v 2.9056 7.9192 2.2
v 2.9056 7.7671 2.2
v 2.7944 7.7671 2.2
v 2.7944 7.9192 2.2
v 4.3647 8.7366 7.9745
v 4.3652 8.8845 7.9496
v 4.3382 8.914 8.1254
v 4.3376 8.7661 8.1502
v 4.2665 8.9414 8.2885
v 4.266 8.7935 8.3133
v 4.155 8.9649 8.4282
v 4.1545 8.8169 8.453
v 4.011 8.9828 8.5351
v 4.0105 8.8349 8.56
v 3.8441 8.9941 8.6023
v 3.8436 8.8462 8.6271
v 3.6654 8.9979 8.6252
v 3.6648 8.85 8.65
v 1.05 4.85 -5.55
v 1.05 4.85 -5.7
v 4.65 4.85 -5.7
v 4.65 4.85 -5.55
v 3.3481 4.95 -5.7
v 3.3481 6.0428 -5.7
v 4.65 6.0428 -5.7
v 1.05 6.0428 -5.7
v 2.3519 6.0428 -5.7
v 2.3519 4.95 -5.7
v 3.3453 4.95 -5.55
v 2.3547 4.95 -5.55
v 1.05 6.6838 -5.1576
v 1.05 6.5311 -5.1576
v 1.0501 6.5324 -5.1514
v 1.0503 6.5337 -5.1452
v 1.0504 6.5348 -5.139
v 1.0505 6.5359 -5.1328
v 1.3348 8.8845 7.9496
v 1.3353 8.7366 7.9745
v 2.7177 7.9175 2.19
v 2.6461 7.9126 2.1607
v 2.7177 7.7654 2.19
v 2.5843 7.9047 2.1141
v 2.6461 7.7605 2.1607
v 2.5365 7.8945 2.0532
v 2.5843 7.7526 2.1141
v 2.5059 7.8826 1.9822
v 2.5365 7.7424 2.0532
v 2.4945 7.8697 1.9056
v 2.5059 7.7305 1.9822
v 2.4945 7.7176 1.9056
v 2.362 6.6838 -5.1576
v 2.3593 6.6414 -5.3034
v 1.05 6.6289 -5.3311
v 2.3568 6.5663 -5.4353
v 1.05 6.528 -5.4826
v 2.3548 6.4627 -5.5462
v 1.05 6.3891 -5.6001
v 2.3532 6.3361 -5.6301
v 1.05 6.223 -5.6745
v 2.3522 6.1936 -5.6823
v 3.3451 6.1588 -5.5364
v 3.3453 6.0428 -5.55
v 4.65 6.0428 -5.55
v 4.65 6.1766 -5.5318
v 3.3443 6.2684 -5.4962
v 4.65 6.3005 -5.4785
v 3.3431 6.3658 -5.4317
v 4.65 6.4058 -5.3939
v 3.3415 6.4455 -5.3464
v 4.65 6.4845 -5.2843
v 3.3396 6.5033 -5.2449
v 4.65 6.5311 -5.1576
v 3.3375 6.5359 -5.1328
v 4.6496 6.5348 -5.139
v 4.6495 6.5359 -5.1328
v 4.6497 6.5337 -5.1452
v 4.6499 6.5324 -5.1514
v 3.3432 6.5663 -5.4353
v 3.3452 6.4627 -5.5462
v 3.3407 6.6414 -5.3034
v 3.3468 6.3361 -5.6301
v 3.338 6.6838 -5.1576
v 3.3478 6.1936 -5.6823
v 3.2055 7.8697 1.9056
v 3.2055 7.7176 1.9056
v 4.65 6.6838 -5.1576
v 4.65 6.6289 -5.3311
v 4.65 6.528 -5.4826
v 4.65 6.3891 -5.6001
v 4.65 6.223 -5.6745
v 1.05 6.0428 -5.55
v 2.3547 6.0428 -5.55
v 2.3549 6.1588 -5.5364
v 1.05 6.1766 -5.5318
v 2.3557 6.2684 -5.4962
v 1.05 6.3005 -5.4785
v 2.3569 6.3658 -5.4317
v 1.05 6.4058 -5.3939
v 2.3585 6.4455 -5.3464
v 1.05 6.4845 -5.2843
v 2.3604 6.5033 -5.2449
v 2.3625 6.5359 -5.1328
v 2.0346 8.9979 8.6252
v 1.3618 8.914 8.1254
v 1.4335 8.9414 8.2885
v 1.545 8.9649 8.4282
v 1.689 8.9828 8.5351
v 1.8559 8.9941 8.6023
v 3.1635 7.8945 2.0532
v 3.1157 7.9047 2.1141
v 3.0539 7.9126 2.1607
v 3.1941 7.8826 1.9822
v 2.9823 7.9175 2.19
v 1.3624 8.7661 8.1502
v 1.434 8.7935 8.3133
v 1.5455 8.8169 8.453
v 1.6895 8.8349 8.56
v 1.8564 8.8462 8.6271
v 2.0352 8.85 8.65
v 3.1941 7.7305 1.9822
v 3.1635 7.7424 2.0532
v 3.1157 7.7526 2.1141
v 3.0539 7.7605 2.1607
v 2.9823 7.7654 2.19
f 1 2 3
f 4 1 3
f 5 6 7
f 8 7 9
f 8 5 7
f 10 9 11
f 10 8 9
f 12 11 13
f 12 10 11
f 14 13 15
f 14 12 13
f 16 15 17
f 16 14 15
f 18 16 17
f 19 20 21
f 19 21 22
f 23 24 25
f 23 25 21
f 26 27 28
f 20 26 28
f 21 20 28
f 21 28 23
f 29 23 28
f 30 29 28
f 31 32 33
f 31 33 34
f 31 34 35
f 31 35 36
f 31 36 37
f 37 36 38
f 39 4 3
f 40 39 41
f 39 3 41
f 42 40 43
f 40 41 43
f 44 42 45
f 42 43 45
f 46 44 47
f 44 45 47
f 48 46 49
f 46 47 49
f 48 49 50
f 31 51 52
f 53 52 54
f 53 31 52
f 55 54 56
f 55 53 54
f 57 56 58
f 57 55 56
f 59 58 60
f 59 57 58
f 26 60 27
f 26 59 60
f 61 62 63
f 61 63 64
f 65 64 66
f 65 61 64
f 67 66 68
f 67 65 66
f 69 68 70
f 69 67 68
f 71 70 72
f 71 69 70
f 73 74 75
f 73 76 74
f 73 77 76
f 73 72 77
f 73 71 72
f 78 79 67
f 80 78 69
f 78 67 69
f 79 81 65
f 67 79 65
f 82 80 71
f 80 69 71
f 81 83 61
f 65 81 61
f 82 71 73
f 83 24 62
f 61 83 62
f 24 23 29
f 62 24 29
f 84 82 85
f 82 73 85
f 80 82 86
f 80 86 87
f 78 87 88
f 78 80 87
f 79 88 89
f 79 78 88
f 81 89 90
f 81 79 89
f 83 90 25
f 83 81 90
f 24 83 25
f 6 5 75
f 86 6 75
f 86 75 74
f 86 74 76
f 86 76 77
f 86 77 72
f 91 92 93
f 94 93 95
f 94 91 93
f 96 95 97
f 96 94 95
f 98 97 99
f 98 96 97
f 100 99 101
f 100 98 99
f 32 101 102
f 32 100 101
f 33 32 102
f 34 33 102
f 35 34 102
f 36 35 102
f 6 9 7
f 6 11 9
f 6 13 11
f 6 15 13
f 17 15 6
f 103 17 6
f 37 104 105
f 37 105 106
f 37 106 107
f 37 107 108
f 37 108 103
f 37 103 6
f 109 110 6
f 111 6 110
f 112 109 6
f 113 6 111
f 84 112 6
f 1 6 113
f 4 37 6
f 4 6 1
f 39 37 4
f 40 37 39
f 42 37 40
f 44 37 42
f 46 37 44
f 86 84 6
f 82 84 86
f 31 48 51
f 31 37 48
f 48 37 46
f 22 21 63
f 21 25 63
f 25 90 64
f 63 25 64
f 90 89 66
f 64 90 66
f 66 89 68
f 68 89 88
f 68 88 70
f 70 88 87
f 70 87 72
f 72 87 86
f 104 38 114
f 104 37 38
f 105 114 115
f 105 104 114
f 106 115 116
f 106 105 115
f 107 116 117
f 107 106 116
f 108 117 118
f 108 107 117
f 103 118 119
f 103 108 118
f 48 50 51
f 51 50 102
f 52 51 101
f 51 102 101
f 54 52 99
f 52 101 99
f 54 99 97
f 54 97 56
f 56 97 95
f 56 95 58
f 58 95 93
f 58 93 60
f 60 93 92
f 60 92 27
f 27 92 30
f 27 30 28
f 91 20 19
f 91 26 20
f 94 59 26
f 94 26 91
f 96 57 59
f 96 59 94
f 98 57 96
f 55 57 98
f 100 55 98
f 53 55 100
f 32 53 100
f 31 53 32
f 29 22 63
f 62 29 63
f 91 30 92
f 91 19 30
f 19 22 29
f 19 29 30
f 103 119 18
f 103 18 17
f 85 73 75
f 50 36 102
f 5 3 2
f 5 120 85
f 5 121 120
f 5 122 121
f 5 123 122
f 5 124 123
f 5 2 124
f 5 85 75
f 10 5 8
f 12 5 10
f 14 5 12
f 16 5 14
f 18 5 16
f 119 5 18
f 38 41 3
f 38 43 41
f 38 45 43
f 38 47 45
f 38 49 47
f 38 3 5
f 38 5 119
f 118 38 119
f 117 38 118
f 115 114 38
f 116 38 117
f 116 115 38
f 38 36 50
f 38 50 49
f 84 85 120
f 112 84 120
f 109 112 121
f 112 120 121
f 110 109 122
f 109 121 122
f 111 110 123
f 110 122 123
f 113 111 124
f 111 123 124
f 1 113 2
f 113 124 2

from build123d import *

# Parameters (mm, degrees)
SHORT_LEVER_DEPTH      = 1.8
SHORT_LEVER_DEPTH_BACK = 1.8
LEVER_CUT_DEPTH        = 4.04793
FILLET_1_R             = 0.7


with BuildPart() as part:
    # Short → Short_Lever (new, two sides: drawn at the far end of the back side and taken through both)
    with BuildSketch(Plane(origin=(2.85, 0, 0), x_dir=(0, 0, -1), z_dir=(1, 0, 0)).offset(-SHORT_LEVER_DEPTH_BACK)):
        with BuildLine():
            Line((5.55, 4.85), (5.55, 6.042820323))
            ThreePointArc((5.55, 6.042820323), (5.431703238, 6.365779512), (5.132789449, 6.535918596))
            Line((5.132789449, 6.535918596), (-8.65, 8.85))
            Line((-8.65, 8.85), (-8.625163165, 8.997929482))
            Line((-8.625163165, 8.997929482), (5.157626284, 6.683848078))
            ThreePointArc((5.157626284, 6.683848078), (5.54621421, 6.462667269), (5.7, 6.042820323))
            Line((5.7, 6.042820323), (5.7, 4.85))
            Line((5.7, 4.85), (5.55, 4.85))
        make_face()
    extrude(amount=SHORT_LEVER_DEPTH + SHORT_LEVER_DEPTH_BACK)

    # Эскиз2 → Lever_Cut (cut)
    with BuildSketch(Plane(origin=(0, 4.95, 0), x_dir=(1, 0, 0), z_dir=(0, 1, 0))):
        Polygon((1.05, 5.157626284), (1.35, -8.65), (1.05, -8.65), align=None)
        Polygon((4.65, 5.157626284), (4.65, -8.65), (4.35, -8.65), align=None)
        with BuildLine():
            Line((2.35, 5.8), (3.35, 5.8))
            Line((3.35, 5.8), (3.20551955, -1.905624011))
            ThreePointArc((3.20551955, -1.905624011), (3.115706509, -2.11411119), (2.90557227, -2.2))
            Line((2.90557227, -2.2), (2.79442773, -2.2))
            ThreePointArc((2.79442773, -2.2), (2.584293491, -2.11411119), (2.49448045, -1.905624011))
            Line((2.49448045, -1.905624011), (2.35, 5.8))
        make_face()
    extrude(amount=LEVER_CUT_DEPTH, mode=Mode.SUBTRACT)

    # Скругление1
    fillet_1_edges = [part.edges().sort_by_distance(p)[0] for p in [
        (1.349730184, 8.923964741, 8.637581583),
        (4.350269816, 8.923964741, 8.637581583),
    ]]
    fillet(fillet_1_edges, radius=FILLET_1_R)


solid = part.part
